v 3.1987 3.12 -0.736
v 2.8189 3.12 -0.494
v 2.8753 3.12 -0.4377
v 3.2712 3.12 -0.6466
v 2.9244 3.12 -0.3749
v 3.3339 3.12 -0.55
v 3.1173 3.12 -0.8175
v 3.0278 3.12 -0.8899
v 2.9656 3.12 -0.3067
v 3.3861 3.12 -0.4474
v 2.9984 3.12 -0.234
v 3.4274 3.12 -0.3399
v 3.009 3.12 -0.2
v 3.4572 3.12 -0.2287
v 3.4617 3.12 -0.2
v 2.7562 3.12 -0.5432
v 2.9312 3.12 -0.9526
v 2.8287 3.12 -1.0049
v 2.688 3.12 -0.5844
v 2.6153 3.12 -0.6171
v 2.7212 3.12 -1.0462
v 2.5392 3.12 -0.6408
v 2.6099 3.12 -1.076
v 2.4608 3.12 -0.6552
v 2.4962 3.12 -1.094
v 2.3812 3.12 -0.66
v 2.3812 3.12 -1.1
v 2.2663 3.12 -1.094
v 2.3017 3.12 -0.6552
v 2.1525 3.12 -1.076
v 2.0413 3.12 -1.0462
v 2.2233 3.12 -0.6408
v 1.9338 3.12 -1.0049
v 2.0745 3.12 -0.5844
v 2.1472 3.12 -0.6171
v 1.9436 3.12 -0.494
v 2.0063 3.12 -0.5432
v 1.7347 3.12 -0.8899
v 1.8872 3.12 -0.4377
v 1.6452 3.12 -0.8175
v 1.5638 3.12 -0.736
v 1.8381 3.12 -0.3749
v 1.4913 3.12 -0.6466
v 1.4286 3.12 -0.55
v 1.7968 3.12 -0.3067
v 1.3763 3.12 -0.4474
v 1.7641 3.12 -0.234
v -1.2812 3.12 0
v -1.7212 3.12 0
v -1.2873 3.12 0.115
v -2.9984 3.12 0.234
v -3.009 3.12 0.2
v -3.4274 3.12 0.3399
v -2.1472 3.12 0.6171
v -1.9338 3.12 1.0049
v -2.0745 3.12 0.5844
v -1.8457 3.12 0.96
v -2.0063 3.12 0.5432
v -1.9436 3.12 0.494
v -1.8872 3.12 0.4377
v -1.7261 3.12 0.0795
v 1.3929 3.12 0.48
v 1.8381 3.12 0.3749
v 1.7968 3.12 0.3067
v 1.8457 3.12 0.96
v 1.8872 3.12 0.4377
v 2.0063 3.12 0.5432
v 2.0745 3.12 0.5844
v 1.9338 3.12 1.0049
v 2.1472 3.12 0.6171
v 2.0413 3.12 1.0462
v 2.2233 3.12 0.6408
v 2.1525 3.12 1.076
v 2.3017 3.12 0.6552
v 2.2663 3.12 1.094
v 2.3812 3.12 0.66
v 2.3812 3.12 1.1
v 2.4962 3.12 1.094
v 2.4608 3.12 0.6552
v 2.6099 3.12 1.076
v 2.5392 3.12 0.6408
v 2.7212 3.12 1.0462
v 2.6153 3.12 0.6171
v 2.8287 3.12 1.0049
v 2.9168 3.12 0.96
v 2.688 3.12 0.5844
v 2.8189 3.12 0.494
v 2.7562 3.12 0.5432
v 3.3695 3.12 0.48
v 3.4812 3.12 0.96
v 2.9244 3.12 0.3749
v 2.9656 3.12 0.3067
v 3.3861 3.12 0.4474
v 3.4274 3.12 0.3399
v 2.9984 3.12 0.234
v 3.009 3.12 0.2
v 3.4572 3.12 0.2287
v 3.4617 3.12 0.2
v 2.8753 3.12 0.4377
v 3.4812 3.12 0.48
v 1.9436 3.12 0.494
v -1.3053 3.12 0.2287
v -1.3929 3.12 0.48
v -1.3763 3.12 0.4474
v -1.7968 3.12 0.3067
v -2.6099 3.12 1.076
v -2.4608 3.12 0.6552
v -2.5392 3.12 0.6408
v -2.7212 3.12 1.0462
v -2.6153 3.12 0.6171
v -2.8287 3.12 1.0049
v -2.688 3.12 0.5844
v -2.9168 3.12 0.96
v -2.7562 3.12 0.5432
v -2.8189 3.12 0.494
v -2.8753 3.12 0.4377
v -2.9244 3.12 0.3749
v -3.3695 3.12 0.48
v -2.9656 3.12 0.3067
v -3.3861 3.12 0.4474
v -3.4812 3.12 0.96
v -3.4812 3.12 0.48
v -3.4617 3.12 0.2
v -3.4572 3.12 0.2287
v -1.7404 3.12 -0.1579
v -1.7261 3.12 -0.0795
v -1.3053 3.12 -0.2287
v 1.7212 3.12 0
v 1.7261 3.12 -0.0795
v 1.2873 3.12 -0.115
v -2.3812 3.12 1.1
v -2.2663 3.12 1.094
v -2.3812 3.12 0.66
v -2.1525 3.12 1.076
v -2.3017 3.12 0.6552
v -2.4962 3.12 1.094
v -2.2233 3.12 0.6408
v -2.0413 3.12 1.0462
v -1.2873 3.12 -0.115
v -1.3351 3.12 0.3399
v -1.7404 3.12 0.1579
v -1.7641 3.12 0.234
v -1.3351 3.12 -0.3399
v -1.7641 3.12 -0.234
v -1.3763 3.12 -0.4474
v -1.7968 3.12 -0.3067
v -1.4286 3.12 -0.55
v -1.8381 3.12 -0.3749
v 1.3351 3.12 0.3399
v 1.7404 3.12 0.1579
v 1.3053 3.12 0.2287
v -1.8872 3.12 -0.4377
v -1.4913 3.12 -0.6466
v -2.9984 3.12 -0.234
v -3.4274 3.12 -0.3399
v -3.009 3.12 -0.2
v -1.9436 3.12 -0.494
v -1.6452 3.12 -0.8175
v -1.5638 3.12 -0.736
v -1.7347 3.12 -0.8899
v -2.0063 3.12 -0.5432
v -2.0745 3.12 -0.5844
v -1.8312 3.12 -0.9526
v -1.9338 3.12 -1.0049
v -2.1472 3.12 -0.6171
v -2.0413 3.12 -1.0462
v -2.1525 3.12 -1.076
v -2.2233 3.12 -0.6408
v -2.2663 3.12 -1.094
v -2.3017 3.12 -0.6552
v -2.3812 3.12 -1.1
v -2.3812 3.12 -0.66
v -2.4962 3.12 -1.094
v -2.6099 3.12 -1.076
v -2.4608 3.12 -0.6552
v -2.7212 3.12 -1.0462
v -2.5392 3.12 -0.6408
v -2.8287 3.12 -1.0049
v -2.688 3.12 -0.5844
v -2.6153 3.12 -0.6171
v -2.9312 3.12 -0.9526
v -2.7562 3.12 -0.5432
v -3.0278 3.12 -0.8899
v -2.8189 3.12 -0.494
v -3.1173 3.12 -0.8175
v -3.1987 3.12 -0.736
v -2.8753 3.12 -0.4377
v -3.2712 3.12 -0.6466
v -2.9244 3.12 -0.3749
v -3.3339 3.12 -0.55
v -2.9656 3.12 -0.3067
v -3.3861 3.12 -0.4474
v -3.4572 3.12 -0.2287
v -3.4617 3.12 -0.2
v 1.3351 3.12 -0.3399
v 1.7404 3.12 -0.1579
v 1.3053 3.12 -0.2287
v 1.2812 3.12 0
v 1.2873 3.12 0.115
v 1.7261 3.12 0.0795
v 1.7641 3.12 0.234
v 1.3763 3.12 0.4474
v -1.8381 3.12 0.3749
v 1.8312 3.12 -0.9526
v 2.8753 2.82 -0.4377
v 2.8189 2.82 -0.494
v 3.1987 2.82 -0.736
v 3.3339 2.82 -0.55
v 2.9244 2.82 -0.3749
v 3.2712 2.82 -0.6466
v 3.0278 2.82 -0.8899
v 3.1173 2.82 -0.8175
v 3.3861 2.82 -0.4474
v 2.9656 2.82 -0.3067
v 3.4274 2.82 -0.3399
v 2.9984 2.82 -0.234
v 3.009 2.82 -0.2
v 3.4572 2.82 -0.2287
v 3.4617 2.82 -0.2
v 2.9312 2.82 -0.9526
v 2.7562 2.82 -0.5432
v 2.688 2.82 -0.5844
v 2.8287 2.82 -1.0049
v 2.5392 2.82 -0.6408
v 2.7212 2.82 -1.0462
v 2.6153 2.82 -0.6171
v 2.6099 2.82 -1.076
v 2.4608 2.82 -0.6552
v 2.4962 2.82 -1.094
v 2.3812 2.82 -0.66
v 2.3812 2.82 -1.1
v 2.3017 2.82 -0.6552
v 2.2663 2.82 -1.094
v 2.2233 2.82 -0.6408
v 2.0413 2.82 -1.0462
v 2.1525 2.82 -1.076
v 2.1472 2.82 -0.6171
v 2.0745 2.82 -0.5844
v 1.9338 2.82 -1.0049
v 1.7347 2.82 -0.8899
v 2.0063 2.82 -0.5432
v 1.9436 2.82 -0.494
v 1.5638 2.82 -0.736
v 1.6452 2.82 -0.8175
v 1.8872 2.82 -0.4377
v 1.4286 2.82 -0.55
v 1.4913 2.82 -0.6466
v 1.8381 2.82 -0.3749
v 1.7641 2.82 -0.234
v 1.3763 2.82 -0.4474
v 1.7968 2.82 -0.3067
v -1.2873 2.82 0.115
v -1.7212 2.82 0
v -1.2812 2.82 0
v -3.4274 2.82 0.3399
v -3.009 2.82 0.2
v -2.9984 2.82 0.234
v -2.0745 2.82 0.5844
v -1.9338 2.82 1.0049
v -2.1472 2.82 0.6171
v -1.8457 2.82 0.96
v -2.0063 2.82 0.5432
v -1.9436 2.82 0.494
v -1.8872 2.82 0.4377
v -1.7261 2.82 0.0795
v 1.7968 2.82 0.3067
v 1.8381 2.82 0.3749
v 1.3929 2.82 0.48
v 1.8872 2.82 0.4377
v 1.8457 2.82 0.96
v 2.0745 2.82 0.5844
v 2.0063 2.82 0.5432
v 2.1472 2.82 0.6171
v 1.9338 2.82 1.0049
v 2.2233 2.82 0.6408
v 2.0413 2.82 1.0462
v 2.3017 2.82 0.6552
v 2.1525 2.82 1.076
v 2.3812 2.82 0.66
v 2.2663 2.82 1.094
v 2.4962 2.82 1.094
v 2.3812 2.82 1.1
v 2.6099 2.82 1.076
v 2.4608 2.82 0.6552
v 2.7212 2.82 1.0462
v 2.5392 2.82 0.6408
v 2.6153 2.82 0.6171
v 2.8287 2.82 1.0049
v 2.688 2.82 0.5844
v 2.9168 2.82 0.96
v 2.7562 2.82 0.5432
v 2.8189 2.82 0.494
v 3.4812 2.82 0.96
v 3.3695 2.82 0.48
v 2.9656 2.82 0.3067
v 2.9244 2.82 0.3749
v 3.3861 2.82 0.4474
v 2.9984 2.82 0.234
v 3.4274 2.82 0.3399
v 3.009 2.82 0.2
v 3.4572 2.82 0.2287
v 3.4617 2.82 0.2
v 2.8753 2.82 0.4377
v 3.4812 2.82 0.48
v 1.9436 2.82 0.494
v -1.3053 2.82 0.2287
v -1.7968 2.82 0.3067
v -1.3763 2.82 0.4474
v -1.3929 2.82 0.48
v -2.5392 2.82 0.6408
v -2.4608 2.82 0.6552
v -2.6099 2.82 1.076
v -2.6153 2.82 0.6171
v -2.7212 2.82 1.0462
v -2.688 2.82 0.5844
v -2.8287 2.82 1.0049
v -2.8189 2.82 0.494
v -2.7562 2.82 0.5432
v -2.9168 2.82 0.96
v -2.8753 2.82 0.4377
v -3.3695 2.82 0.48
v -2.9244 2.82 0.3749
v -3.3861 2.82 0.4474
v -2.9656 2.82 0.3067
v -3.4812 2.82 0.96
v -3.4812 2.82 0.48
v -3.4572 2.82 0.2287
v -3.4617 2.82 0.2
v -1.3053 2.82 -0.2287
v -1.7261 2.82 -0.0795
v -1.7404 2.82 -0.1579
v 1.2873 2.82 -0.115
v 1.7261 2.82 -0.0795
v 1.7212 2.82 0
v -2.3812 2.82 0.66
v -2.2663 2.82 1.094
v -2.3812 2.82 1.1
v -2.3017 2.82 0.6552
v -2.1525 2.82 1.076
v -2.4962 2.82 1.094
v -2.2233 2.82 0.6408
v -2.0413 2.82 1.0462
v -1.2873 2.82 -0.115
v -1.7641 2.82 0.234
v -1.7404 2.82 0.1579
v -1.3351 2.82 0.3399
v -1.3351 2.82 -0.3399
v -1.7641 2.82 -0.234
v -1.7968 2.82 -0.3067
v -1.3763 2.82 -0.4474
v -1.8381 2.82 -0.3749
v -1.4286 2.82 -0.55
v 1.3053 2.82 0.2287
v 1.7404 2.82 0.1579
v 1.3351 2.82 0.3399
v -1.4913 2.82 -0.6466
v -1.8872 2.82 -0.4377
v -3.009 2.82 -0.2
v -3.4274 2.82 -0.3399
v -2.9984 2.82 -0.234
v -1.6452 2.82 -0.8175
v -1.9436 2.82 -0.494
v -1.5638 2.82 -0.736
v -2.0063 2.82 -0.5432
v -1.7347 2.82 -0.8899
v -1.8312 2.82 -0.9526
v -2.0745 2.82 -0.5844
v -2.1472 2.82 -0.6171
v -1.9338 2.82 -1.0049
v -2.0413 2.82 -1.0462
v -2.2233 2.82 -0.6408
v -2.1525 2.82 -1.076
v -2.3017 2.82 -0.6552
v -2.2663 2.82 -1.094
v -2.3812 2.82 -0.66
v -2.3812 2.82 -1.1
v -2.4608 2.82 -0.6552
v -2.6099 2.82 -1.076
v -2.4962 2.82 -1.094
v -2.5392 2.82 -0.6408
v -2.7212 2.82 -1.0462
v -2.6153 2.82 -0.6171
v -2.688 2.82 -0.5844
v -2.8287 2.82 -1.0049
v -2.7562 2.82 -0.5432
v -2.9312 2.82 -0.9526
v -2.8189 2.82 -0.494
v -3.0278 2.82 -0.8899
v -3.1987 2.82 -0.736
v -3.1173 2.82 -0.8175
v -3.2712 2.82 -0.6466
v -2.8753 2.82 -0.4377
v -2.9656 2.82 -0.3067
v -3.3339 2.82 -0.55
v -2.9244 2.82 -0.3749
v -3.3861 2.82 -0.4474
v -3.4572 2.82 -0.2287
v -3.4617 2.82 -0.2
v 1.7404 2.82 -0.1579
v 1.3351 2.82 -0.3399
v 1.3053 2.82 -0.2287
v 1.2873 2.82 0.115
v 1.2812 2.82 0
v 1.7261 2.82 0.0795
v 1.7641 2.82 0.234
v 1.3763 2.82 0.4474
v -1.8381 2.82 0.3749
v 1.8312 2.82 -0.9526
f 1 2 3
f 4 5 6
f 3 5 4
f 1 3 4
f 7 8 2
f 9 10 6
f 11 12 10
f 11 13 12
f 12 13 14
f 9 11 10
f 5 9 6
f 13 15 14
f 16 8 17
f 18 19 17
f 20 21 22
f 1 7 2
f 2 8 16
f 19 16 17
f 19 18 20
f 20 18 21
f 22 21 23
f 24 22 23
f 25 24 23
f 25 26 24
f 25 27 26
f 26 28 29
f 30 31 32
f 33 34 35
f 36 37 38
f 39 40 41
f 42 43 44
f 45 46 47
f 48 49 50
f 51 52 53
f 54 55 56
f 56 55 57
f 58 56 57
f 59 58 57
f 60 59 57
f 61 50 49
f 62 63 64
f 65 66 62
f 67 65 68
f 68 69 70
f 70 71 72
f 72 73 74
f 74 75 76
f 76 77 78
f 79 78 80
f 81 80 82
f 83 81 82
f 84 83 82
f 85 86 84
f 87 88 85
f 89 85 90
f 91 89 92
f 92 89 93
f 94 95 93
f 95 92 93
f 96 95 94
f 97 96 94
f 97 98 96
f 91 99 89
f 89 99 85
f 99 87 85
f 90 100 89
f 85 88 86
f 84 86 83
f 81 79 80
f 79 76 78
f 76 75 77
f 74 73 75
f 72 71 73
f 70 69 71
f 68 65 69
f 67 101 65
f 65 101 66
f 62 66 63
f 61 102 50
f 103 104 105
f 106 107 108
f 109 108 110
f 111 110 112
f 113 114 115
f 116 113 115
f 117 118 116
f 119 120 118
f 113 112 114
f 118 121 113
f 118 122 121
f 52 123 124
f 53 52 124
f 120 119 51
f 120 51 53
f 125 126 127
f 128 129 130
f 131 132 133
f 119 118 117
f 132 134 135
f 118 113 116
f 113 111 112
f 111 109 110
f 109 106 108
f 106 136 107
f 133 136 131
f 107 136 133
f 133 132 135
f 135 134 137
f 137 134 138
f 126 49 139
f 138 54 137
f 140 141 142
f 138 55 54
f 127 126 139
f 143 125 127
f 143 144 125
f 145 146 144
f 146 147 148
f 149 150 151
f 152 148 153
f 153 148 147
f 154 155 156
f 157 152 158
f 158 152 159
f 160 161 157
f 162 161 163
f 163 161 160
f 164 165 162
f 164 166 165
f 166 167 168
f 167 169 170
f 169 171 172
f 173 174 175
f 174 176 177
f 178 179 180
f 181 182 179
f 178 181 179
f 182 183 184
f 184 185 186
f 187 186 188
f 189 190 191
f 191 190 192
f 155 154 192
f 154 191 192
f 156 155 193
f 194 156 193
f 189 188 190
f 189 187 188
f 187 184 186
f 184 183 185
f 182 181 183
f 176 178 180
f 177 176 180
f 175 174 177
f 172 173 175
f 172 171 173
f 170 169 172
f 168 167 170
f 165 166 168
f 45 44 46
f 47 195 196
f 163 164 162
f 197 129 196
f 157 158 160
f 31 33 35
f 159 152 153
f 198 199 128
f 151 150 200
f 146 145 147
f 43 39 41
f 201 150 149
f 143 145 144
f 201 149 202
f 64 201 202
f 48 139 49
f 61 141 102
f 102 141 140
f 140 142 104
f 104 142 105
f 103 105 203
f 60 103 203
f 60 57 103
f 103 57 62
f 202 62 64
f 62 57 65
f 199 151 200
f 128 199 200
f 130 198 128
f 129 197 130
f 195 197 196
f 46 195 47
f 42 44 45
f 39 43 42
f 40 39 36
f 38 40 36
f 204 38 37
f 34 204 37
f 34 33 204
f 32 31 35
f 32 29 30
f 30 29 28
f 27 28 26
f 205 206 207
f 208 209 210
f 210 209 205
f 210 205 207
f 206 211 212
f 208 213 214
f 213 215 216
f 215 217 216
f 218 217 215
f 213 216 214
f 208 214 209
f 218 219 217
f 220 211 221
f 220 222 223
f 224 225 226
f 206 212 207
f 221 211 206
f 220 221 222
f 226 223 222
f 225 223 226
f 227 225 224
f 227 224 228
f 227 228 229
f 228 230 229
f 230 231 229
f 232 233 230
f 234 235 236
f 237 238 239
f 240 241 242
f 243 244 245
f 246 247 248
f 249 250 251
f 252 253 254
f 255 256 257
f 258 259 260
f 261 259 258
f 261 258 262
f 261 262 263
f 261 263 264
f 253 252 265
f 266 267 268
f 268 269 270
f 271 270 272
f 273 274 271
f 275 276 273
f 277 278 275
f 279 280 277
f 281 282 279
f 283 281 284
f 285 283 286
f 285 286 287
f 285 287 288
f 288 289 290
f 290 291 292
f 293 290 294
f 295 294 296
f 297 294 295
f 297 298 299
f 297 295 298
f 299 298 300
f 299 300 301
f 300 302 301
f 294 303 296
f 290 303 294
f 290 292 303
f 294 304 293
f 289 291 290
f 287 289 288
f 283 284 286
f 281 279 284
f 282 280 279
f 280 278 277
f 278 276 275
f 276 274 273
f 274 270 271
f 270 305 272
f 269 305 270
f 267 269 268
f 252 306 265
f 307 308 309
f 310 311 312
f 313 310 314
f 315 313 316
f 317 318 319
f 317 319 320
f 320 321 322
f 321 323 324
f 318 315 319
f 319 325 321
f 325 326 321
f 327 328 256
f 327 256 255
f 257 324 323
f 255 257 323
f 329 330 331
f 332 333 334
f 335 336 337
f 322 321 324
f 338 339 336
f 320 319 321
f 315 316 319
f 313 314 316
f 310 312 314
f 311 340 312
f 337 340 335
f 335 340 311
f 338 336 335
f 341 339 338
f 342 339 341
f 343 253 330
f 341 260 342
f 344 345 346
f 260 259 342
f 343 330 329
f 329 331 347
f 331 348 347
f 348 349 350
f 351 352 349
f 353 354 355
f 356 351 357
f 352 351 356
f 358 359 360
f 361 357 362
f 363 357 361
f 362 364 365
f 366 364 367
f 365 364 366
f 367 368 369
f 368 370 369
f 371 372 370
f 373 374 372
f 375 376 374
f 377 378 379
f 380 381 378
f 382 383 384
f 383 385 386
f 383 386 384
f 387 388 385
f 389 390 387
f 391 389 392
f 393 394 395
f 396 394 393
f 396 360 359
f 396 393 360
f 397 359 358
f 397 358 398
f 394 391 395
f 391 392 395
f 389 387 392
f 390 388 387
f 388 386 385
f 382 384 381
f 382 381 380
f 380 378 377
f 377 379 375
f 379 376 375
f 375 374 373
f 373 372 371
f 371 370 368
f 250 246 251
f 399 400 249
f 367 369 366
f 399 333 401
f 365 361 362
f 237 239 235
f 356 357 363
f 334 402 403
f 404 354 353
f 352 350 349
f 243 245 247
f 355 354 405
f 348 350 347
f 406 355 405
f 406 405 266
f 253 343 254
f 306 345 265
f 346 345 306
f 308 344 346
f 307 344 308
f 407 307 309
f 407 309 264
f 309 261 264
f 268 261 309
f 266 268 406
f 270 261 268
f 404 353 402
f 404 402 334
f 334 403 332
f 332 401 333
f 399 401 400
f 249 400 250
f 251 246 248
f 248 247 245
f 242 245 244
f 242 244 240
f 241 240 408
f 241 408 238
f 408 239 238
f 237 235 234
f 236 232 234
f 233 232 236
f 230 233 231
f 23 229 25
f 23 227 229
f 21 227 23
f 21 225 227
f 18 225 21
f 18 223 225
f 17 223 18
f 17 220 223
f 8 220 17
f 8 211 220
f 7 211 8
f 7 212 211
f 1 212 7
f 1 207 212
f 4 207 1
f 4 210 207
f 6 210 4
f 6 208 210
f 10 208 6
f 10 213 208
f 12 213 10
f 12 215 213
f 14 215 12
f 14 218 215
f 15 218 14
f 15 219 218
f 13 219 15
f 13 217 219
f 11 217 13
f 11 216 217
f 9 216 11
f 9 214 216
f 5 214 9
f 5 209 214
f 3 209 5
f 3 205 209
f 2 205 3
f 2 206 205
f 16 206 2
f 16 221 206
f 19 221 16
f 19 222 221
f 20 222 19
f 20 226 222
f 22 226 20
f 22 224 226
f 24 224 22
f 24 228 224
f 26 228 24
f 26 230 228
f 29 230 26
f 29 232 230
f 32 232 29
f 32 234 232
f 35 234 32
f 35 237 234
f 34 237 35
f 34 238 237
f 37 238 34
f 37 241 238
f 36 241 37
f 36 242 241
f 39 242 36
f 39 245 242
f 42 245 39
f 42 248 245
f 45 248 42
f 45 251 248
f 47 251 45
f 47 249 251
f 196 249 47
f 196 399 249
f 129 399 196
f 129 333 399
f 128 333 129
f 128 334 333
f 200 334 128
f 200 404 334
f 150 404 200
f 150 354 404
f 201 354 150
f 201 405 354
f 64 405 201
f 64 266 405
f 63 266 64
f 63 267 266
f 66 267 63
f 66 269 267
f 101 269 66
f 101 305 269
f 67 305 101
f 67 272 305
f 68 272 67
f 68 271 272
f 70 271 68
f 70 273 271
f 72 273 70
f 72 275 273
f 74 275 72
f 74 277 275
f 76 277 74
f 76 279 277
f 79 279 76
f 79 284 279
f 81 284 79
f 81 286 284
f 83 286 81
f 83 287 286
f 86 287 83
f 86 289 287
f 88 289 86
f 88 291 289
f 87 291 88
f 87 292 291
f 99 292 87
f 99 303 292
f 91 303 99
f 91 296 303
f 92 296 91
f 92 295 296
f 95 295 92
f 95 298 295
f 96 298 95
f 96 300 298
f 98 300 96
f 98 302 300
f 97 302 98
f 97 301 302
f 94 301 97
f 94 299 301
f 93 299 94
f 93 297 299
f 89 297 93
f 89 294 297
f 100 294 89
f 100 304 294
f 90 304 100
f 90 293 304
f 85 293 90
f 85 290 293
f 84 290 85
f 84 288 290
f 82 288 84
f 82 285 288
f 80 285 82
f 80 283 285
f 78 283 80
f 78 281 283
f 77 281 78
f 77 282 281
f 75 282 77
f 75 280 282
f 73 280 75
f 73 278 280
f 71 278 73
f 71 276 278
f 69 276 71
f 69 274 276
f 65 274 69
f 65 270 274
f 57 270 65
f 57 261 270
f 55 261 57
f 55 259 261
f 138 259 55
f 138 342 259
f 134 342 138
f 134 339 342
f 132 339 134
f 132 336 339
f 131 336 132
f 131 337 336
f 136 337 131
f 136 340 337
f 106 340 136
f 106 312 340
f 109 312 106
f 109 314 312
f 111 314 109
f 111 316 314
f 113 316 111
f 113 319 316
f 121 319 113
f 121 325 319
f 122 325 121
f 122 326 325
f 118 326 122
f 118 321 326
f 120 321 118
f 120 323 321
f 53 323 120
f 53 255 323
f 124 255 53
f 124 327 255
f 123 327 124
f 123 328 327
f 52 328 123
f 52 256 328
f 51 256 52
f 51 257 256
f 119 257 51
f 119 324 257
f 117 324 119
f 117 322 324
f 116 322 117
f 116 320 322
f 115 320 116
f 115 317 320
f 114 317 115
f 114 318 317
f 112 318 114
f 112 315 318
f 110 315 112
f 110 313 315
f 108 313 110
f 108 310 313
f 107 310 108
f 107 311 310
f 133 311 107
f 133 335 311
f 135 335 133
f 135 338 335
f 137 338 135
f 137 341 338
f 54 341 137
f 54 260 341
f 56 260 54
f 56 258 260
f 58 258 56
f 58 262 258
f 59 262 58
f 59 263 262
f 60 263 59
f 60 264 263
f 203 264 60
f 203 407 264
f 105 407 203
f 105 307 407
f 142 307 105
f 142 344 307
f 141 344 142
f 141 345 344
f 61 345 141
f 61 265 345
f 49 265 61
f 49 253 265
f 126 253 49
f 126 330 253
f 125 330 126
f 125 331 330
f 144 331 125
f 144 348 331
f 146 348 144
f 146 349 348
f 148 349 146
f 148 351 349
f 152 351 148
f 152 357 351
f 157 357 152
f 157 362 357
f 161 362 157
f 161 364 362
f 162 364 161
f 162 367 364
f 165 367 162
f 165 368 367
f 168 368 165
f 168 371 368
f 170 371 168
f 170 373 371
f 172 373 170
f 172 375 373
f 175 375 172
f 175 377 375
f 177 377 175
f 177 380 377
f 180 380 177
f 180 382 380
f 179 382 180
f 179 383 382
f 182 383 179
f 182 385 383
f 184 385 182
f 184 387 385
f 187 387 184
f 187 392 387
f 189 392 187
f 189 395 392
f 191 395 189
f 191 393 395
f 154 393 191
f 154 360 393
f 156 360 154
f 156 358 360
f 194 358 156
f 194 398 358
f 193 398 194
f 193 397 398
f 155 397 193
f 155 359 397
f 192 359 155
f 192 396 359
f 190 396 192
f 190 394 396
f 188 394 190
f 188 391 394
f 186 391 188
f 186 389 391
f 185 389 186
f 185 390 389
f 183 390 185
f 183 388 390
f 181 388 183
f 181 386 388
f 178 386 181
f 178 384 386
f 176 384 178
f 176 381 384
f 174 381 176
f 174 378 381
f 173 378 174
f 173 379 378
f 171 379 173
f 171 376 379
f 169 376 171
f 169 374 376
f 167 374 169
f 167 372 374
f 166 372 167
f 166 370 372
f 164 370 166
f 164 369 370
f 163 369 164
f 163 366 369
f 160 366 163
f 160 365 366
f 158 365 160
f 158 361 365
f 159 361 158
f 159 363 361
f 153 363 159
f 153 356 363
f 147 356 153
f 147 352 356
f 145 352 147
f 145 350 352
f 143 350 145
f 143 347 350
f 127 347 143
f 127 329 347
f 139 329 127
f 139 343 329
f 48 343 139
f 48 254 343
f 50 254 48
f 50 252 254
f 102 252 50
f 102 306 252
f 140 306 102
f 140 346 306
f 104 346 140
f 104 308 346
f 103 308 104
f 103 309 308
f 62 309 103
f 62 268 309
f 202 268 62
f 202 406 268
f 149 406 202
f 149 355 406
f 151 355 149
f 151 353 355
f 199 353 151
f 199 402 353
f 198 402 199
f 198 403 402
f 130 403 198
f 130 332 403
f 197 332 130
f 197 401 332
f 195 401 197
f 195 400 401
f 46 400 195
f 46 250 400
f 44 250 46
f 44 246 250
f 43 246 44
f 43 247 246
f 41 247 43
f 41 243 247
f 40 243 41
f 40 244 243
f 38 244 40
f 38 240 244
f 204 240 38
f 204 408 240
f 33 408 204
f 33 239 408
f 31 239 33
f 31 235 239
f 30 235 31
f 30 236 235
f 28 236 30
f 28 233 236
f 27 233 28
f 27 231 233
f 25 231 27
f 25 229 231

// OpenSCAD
// file: ch1_03c_params.scad
// CH1 03C 单排滚子链 — 尺寸真值源：docs/parts/CH1-03C-roller-chain.md
// 单位：毫米。这是外购碳钢链条的 CAD 包络，不是 FDM 打印件。

//#region 导入/依赖
// 无外部库；几何由本文件常数驱动。
//#endregion

//#region 常量/配置
P = 4.7625;          // 节距：系列表 / SKU 210L（图面写 4.762）
h2 = 4.3;            // 内链板高度 h2（卖家图 + ISO h2 max）
d1 = 2.48;           // 03C 图面「滚子」= ISO 套筒外径 d1 max（本规格无独立滚子）
d2 = 1.62;           // 销轴直径 d2 max
Lc = 6.9;            // ISO / 图面销轴总长 Lc max；装配外形用贴板铆头，不把细杆伸出这么长
L = 6.10;            // 铆头内侧销长 L max（ISO，图面未标数）
T = 0.6;             // 链板厚度 T max
b1 = 2.38;           // 内节内宽 b1 min（ISO；图面有符号无数字）
waist = 2.6;         // 链板腰宽：按卖家 8 字外形，不是标准表列
rivet_d = 2.15;      // 铆头直径：按侧视铆头 > d2
rivet_h = 0.40;      // 贴在外板外侧的铆头高度；避免 (Lc-L)/2 拉出细 stem
fillet = 0.42;       // 腰部凹圆角
roller_end_gap = 0.02;  // 仅 CSG 间隙，不留可见轴向窜动
journal_od = 2.05;      // 穿内板轴颈；可见鼓面仍用 d1
links_sku = 210;

inner_width = b1;
bushing_od = journal_od;
plate_stack = inner_width + 4 * T;
outer_face = plate_stack / 2;
pin_length = plate_stack + 2 * rivet_h;
visible_bush_len = inner_width - 2 * roller_end_gap;
clearance = 0.04;
eps = 0.05;
//#endregion

//#region 模型/类型
// 无独立类型；零件由 inner/outer plate、roller、pin、bushing 组成。
//#endregion

//#region 私有成员
// 几何常数全部公开给根模型 include。
//#endregion

//#region 公开 API
// include 后直接使用 P / h2 / d1 / d2 / pin_length / T。
//#endregion

//#region 业务逻辑
// SKU 210L × 4.7625 mm = 1000.125 mm。
// b1 / L 图面未标数，取 ISO 03C min/max；链板腰宽按卖家 8 字外形。
// 可见套筒长度必须是 b1，不是 b1+2T；后者会从斜向看成过长的连接棍。
// 销轴细杆只穿过板叠；铆头贴外板。Lc=6.9 是规格上限，不是要把 stem 拉到 6.9。
//#endregion

//#region 方法/工具
// 无。
//#endregion
// file: parts/ch1_03c_connecting_link_params.scad
// CH1 03C 连接节五金 — 由 docs/parts/CH1-03C-roller-chain.md 参数化
// 单位：毫米。03C 链条本体是外购碳钢件；这里是连接节穿销/弹片的参考模型。

//#region 导入/依赖
include <../ch1_03c_params.scad>
//#endregion

//#region 常量/配置
$fa = 6;
$fs = 0.08;

// 文档明确给出的连接节主尺寸。
CONNECTING_PIN_PAIR_SPACING = P;       // 两根穿销的中心距 = 链条节距
CONNECTING_PIN_SHAFT_D = d2;           // 03C 销轴直径
CONNECTING_PIN_LENGTH = Lc;            // 03C 图面销轴总长
CONNECTING_PIN_HEAD_D = rivet_d;       // 固定端圆头的参考直径
CONNECTING_PIN_HEAD_H = rivet_h;

// 卖家文档没有给 CL 弹片专用槽宽/展开图；以下是装配原型的显式假设。
// 夹片从销轴侧面滑入槽内，内孔小于销身但大于槽底，形成卡持。
CONNECTING_PIN_GROOVE_D = 1.20;
CONNECTING_PIN_GROOVE_W = 0.34;
CONNECTING_PIN_GROOVE_FROM_TIP = 0.48;
CONNECTING_PIN_GROOVE_CENTER = CONNECTING_PIN_LENGTH / 2 - CONNECTING_PIN_GROOVE_FROM_TIP;

RETAINING_CLIP_T = 0.30;
RETAINING_CLIP_EAR_OD = 2.20;
RETAINING_CLIP_HOLE_D = CONNECTING_PIN_GROOVE_D + 0.12;
RETAINING_CLIP_ENTRY_W = 0.40;
RETAINING_CLIP_BRIDGE_T = 0.48;
RETAINING_CLIP_BRIDGE_Z = 0.72;
CONNECTING_LINK_EPS = 0.05;
//#endregion

//#region 模型/类型
// 连接节局部坐标：两销中心位于 x=±P/2，销轴沿 +Y；固定头在 -Y 端。
// 弹片位于 +Y 端槽内，两个 C 形耳孔的开口朝外，便于侧向滑入。
//#endregion

//#region 公开 API
// include 后可调用 ch1_03c_connecting_pin_pair()、ch1_03c_retaining_clip()。
//#endregion

//#region 私有成员
module connecting_pin_groove_cut(x) {
    translate([
        x,
        CONNECTING_PIN_GROOVE_CENTER - CONNECTING_PIN_GROOVE_W / 2,
        0
    ])
        rotate([-90, 0, 0])
            difference() {
                cylinder(
                    d = CONNECTING_PIN_SHAFT_D + 0.60,
                    h = CONNECTING_PIN_GROOVE_W
                );
                translate([0, 0, -CONNECTING_LINK_EPS])
                    cylinder(
                        d = CONNECTING_PIN_GROOVE_D,
                        h = CONNECTING_PIN_GROOVE_W + 2 * CONNECTING_LINK_EPS
                    );
            }
}

module connecting_pin_one(x) {
    difference() {
        union() {
            translate([x, -CONNECTING_PIN_LENGTH / 2, 0])
                rotate([-90, 0, 0])
                    cylinder(d = CONNECTING_PIN_SHAFT_D, h = CONNECTING_PIN_LENGTH);
            translate([x, -CONNECTING_PIN_LENGTH / 2, 0])
                rotate([-90, 0, 0])
                    cylinder(d = CONNECTING_PIN_HEAD_D, h = CONNECTING_PIN_HEAD_H);
        }
        connecting_pin_groove_cut(x);
    }
}

module retaining_clip_profile_2d() {
    difference() {
        union() {
            for (x = [-CONNECTING_PIN_PAIR_SPACING / 2, CONNECTING_PIN_PAIR_SPACING / 2])
                translate([x, 0])
                    circle(d = RETAINING_CLIP_EAR_OD);
            translate([0, RETAINING_CLIP_BRIDGE_Z])
                square([
                    CONNECTING_PIN_PAIR_SPACING + RETAINING_CLIP_EAR_OD,
                    RETAINING_CLIP_BRIDGE_T
                ], center = true);
        }
        for (side = [-1, 1]) {
            translate([side * CONNECTING_PIN_PAIR_SPACING / 2, 0])
                circle(d = RETAINING_CLIP_HOLE_D);
            // 侧向入口：切到外缘，保留上方桥接和内侧耳根。
            translate([
                side * (
                    CONNECTING_PIN_PAIR_SPACING / 2
                    + RETAINING_CLIP_EAR_OD / 2
                    - 0.05
                ),
                0
            ])
                square([
                    RETAINING_CLIP_EAR_OD,
                    RETAINING_CLIP_ENTRY_W
                ], center = true);
        }
    }
}
//#endregion

//#region 业务逻辑
module ch1_03c_connecting_pin_pair() {
    for (x = [-CONNECTING_PIN_PAIR_SPACING / 2, CONNECTING_PIN_PAIR_SPACING / 2])
        connecting_pin_one(x);
}

module ch1_03c_retaining_clip() {
    // 与双销保持同一装配坐标；单独打印时应将夹片绕 X 轴旋转 90° 铺平。
    translate([0, CONNECTING_PIN_GROOVE_CENTER, 0])
        rotate([90, 0, 0])
            linear_extrude(
                height = RETAINING_CLIP_T,
                center = true,
                convexity = 6
            )
                retaining_clip_profile_2d();
}

module ch1_03c_connecting_link_reference() {
    color("#b08d57") ch1_03c_connecting_pin_pair();
    color("#9aa7b6") ch1_03c_retaining_clip();
}
//#endregion

//#region 方法/工具
// 此文件是库；独立导出入口见 cad/openscad/ch1_03c_connecting_pin.scad
// 和 cad/openscad/ch1_03c_retaining_clip.scad。
//#endregion
// main file
// CH1 03C 连接节固定弹片/夹片 — 独立模型库入口

//#region 导入/依赖
include <parts/ch1_03c_connecting_link_params.scad>
//#endregion

//#region 常量/配置
PART = is_undef(PART) ? "clip" : PART;
//#endregion

//#region 公开 API
if (PART == "clip")
    ch1_03c_retaining_clip();
else if (PART == "assembly")
    ch1_03c_connecting_link_reference();
//#endregion

//#region 业务逻辑
// 夹片为按 03C 节距布局的双 C 耳结构；具体钢片厚度/展开形状需按实物 CL 件复核。
//#endregion
